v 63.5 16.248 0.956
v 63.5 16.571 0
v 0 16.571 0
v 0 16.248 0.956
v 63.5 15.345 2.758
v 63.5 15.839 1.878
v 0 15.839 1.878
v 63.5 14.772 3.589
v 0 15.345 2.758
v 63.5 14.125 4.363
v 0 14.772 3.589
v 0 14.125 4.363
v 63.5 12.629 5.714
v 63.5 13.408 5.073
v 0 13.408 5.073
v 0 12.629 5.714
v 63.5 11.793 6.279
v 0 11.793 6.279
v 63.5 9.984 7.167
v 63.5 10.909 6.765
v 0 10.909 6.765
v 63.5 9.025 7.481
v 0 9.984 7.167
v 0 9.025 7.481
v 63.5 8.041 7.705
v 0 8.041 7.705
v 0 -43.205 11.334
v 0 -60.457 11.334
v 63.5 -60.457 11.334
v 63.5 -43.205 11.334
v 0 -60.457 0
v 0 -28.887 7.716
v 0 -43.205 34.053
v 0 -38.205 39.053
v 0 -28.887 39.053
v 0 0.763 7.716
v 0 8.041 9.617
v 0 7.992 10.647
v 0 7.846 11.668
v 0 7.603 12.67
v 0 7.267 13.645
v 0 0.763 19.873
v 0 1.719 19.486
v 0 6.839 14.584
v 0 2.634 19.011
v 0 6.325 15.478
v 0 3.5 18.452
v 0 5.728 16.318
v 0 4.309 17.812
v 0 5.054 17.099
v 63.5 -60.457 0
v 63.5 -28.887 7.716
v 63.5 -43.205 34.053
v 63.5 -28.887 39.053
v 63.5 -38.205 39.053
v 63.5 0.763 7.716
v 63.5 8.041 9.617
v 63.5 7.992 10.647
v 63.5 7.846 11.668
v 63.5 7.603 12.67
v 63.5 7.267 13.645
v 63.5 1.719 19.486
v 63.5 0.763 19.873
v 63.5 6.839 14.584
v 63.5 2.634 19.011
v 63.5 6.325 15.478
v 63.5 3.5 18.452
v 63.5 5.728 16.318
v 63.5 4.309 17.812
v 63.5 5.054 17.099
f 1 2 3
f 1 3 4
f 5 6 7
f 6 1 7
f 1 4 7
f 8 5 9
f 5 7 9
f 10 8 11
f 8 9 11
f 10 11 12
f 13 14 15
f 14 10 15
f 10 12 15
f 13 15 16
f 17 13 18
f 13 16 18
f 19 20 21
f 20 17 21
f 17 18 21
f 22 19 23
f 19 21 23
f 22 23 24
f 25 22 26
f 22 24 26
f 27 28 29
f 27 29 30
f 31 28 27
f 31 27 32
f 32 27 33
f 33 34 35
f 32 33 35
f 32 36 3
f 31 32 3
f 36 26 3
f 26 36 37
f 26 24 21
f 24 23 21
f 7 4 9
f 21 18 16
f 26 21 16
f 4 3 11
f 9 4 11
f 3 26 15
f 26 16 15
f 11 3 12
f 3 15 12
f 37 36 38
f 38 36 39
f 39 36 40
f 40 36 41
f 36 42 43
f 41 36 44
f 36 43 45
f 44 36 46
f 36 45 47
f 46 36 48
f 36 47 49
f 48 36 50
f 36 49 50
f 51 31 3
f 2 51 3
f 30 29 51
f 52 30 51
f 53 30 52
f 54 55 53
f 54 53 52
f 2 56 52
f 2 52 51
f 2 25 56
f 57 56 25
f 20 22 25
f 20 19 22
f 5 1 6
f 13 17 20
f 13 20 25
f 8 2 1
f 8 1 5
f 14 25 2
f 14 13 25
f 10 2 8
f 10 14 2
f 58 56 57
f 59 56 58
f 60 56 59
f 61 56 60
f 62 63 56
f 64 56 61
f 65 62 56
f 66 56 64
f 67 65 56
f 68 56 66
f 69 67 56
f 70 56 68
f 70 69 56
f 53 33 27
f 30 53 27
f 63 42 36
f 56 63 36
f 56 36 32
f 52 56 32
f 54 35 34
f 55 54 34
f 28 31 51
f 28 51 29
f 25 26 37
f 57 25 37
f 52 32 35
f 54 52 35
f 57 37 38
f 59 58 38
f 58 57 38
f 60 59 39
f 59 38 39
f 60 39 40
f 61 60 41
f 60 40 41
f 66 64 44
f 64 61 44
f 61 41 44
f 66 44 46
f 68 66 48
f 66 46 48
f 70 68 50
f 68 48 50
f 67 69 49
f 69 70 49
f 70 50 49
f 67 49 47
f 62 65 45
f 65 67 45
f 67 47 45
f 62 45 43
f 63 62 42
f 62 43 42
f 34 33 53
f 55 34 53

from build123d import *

# Parameters (mm, degrees)
F0_W        = 17.2521322966
F0_H        = 11.3339135423
F1_DEPTH    = 63.5
F2_T1_DEPTH = 116.9691747536
F2_T3_DEPTH = 114.7757874589
F3_SIZE     = 5


# Not quite as in the source:
# - a fillet or chamfer that OpenCascade refuses, or shapes differently, is made with other operations: its cross-section is extruded or revolved along the edge and cut away or added


with BuildPart() as f1:
    # F0 (on Right) → F1 (new body)
    with BuildSketch(Plane.YZ):
        Polygon((-28.8866702467, 39.0534885228), (-43.2048514485, 39.0534885228), (-43.2048514485, 11.3339135423), (-43.2048514485, 0), (16.9898695312, 0), (16.9898695312, 7.7048568055), (8.0409916118, 7.7048568055), (8.0409916118, 19.8725238442), (0.7627514424, 19.8725238442), (0.7627514424, 7.7155772597), (-28.8866702467, 7.7155772597), align=None)
        with Locations((-51.8309175968, 5.6669567712)):
            Rectangle(F0_W, F0_H)
    extrude(amount=F1_DEPTH)

    # F2: fillet of radius 10.8639610307 on 2 edges, made by hand

    # F2_s2 → F2_t1 (cut)
    with BuildSketch(Plane.YZ.offset(-26.7345873768)):
        with BuildLine():
            ThreePointArc((16.9898695312, -2.9889781452), (14.4575061135, 3.9831184184), (8.0409916118, 7.7048568055))
            Line((8.0409916118, 7.7048568055), (16.9898695312, 7.7048568055))
            Line((16.9898695312, 7.7048568055), (16.9898695312, -2.9889781452))
        make_face()
    extrude(amount=F2_T1_DEPTH, mode=Mode.SUBTRACT)

    # F2_s4 → F2_t3 (cut)
    with BuildSketch(Plane.YZ.offset(-25.6378937294)):
        with BuildLine():
            ThreePointArc((8.0409916118, 9.6173663525), (6.0365108418, 15.9050733102), (0.7627514424, 19.8725238442))
            Line((0.7627514424, 19.8725238442), (8.0409916118, 19.8725238442))
            Line((8.0409916118, 19.8725238442), (8.0409916118, 9.6173663525))
        make_face()
    extrude(amount=F2_T3_DEPTH, mode=Mode.SUBTRACT)

    # F3
    f3_edges = [f1.edges().sort_by_distance(p)[0] for p in [
        (31.75, -43.204851, 39.053489),
    ]]
    chamfer(f3_edges, length=F3_SIZE)


solid = f1.part
